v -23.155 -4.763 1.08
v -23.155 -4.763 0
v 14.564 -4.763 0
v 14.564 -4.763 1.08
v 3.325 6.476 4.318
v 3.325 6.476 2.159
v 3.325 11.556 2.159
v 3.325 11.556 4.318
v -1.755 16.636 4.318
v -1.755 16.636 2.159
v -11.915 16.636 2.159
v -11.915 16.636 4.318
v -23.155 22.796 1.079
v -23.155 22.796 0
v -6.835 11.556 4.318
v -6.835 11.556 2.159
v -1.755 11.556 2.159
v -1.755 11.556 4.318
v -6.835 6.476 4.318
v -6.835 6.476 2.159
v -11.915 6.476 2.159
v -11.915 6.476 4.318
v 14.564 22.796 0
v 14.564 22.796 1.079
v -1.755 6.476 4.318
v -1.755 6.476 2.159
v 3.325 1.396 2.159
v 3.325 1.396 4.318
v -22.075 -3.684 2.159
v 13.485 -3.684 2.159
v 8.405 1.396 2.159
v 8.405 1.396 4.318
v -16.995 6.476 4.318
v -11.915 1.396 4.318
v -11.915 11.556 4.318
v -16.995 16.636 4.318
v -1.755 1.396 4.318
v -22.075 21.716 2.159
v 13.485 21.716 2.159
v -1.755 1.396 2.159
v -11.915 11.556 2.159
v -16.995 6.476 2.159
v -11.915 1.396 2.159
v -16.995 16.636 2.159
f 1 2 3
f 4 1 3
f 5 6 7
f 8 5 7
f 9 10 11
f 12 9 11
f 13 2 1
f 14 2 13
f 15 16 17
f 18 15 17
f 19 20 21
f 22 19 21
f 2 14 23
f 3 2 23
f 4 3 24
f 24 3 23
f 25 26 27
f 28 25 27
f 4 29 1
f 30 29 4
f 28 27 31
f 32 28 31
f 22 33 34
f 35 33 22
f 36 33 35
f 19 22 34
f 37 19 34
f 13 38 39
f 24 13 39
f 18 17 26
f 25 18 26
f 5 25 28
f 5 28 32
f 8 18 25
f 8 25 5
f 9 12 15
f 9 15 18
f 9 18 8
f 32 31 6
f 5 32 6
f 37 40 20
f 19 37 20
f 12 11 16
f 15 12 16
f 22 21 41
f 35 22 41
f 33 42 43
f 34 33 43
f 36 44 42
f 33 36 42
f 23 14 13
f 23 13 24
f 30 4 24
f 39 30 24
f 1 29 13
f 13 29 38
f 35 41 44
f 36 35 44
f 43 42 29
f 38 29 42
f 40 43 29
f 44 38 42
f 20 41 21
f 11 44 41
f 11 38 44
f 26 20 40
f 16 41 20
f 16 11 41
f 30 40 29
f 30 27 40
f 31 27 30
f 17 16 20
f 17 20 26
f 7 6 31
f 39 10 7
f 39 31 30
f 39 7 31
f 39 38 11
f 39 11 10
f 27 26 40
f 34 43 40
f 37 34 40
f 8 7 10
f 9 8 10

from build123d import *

# Parameters (mm, degrees)
F1_DEPTH = 4.318
F0_W     = 37.719
F0_H     = 27.559
F2_DEPTH = 2.159
F3_SIZE  = 1.0795


with BuildPart() as f1:
    # F0 (on Top) → F1 (new body)
    with BuildSketch(Plane.XY):
        Polygon((-11.915093, 11.556174), (-16.995093, 16.636174), (-16.995093, 11.556174), align=None)
        Polygon((-11.915093, 11.556174), (-16.995093, 11.556174), (-16.995093, 6.476174), align=None)
        Polygon((-11.915093, 6.476174), (-11.915093, 11.556174), (-16.995093, 6.476174), align=None)
        Polygon((-11.915093, 6.476174), (-16.995093, 6.476174), (-11.915093, 1.396174), align=None)
        Polygon((-6.835093, 16.636174), (-11.915093, 16.636174), (-6.835093, 11.556174), align=None)
        Polygon((-1.755093, 11.556174), (-6.835093, 16.636174), (-6.835093, 11.556174), align=None)
        Polygon((-1.755093, 16.636174), (-6.835093, 16.636174), (-1.755093, 11.556174), align=None)
        Polygon((3.324907, 11.556174), (-1.755093, 16.636174), (-1.755093, 11.556174), align=None)
        Polygon((3.324907, 11.556174), (-1.755093, 11.556174), (-1.755093, 6.476174), (3.324907, 1.396174), (8.404907, 1.396174), (3.324907, 6.476174), align=None)
        Polygon((-6.835093, 6.476174), (-11.915093, 6.476174), (-11.915093, 1.396174), (-1.755093, 1.396174), align=None)
    extrude(amount=F1_DEPTH)

    # F0 (on Top) → F2 (join)
    with BuildSketch(Plane.XY):
        with Locations((-4.295093, 9.016174)):
            Rectangle(F0_W, F0_H)
        Polygon((-16.995093, 11.556174), (-16.995093, 16.636174), (-11.915093, 11.556174), (-11.915093, 6.476174), (-6.835093, 6.476174), (-1.755093, 1.396174), (-11.915093, 1.396174), (-16.995093, 6.476174), align=None, mode=Mode.SUBTRACT)
        Polygon((-6.835093, 11.556174), (-11.915093, 16.636174), (-6.835093, 16.636174), (-1.755093, 16.636174), (3.324907, 11.556174), (3.324907, 6.476174), (8.404907, 1.396174), (3.324907, 1.396174), (-1.755093, 6.476174), (-1.755093, 11.556174), align=None, mode=Mode.SUBTRACT)
    extrude(amount=F2_DEPTH)

    # F3
    f3_edges = [f1.edges().sort_by_distance(p)[0] for p in [
        (-4.295093, 22.795674, 2.159),
        (-23.154593, 9.016174, 2.159),
        (14.564407, 9.016174, 2.159),
        (-4.295093, -4.763326, 2.159),
    ]]
    chamfer(f3_edges, length=F3_SIZE)


solid = f1.part
